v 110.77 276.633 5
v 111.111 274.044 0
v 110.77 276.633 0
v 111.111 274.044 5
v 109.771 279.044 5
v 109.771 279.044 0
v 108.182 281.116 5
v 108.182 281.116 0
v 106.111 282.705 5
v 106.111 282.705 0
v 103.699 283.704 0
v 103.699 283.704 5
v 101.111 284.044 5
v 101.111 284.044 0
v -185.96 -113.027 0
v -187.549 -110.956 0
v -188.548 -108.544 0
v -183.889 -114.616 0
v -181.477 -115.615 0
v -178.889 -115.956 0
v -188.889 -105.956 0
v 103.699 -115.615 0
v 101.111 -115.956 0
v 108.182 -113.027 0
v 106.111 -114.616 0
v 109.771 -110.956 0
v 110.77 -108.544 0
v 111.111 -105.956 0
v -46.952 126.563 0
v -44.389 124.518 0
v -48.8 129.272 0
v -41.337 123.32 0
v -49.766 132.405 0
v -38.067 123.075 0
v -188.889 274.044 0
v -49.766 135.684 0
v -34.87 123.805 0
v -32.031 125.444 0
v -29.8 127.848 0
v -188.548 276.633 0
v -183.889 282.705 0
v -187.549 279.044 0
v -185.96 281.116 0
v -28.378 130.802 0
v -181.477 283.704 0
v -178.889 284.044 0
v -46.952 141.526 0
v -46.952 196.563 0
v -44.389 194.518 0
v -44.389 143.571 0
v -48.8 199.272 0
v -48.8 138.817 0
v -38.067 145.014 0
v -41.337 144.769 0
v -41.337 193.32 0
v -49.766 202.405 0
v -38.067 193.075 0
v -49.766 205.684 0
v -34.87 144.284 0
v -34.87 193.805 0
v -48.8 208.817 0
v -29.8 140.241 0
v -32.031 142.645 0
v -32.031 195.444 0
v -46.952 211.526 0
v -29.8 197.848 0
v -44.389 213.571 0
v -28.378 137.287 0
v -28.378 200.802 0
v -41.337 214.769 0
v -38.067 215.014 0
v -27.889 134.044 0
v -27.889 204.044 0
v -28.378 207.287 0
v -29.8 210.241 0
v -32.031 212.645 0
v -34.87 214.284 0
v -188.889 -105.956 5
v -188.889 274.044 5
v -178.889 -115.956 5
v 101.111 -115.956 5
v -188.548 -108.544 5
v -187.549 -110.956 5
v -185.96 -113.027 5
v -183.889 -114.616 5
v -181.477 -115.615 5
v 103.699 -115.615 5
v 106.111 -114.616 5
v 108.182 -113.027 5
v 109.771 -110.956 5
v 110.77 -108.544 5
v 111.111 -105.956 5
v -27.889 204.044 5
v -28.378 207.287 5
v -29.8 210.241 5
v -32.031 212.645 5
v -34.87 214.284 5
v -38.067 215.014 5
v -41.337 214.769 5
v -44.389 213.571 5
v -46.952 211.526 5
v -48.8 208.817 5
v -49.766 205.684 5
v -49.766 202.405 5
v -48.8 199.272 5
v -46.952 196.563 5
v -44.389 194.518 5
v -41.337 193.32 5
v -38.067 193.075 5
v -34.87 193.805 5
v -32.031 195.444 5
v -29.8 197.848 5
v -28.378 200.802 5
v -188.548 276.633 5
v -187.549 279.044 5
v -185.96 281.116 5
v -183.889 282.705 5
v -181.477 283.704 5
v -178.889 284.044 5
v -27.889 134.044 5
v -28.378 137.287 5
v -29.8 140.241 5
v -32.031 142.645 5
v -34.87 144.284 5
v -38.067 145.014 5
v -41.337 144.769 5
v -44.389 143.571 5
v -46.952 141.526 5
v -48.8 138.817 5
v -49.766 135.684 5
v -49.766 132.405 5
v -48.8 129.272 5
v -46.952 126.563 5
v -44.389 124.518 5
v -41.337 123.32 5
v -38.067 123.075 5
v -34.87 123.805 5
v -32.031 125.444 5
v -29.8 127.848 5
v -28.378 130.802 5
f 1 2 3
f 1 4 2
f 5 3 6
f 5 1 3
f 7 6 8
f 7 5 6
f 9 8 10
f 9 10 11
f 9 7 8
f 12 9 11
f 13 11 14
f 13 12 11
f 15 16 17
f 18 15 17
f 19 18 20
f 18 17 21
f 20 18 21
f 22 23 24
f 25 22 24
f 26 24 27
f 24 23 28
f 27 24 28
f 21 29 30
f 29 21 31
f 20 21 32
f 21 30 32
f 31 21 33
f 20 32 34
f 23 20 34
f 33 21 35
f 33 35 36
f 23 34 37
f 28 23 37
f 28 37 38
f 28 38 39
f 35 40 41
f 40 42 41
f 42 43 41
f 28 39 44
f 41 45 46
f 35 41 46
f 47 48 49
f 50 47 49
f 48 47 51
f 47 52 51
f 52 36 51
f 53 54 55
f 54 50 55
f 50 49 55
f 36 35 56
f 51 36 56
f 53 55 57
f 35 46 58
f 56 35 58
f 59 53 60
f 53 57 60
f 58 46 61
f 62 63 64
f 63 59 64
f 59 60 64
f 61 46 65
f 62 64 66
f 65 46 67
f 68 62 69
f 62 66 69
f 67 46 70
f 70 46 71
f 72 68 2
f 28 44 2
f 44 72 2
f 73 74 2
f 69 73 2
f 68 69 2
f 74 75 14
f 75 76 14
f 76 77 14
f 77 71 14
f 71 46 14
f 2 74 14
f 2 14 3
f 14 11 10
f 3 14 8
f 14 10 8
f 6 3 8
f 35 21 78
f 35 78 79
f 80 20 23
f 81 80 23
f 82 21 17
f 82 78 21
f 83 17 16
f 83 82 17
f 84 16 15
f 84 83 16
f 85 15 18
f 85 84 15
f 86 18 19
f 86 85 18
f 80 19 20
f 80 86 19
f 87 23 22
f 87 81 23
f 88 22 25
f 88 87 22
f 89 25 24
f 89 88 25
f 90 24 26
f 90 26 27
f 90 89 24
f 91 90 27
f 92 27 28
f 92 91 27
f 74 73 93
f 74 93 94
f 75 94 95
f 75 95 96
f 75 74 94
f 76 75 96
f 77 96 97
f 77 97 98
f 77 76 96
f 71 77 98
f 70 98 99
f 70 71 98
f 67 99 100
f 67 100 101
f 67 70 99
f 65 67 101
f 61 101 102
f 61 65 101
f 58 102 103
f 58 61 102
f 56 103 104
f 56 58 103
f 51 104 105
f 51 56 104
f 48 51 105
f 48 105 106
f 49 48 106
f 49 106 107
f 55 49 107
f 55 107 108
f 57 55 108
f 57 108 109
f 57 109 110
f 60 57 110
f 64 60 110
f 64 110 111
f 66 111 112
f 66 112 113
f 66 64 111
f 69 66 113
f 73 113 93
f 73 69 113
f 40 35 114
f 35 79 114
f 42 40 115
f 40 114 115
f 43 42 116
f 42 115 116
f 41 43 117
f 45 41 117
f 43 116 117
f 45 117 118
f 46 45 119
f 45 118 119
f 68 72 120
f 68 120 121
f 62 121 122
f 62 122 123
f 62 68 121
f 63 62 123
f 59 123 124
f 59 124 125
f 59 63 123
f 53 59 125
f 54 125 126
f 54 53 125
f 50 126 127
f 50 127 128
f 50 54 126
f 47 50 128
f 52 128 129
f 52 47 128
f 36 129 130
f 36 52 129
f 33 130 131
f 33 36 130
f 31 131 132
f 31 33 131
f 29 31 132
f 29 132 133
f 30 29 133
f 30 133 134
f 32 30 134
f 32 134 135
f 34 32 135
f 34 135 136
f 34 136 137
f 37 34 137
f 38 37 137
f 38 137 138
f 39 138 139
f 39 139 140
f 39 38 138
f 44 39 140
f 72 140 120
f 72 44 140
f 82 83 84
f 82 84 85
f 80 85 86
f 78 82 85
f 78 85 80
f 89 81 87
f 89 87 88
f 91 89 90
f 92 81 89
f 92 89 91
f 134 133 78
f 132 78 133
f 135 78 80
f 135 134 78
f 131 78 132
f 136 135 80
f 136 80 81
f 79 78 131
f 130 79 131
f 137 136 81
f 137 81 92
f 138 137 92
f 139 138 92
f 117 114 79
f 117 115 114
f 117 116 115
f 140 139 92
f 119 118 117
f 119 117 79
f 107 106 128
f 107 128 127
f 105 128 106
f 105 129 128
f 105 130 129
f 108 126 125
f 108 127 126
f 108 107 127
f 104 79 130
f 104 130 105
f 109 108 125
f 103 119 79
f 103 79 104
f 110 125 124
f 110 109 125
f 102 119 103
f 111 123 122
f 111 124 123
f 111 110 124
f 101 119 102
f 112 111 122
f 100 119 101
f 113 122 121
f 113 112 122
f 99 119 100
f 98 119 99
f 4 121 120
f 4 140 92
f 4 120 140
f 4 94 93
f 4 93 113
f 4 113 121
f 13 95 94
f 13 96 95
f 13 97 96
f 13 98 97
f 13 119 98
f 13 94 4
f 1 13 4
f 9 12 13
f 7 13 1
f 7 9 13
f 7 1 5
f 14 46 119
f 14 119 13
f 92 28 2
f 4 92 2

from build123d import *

# Parameters (mm, degrees)
SKETCH_1_W          = 300
SKETCH_1_H          = 400
EXTRUDE_1_DEPTH     = 5
FILLET_1_R          = 10
SKETCH_2_R          = 11
CUT_EXTRUDE_3_DEPTH = 5


with BuildPart() as part:
    # 草图1 → 凸台-拉伸1 (new body)
    with BuildSketch(Plane.XY):
        with Locations((-38.888888889, 84.044438104)):
            Rectangle(SKETCH_1_W, SKETCH_1_H)
    extrude(amount=EXTRUDE_1_DEPTH)

    # 圆角1
    fillet_1_edges = [part.edges().sort_by_distance(p)[0] for p in [
        (-188.888888889, 284.044438104, 2.5),
        (111.111111111, 284.044438104, 2.5),
        (111.111111111, -115.955561896, 2.5),
        (-188.888888889, -115.955561896, 2.5),
    ]]
    fillet(fillet_1_edges, radius=FILLET_1_R)

    # 草图2 → 切除-拉伸3 (cut)
    with BuildSketch(Plane.XY):
        with Locations((-38.888888889, 204.044438104)):
            Circle(SKETCH_2_R)
        with Locations((-38.888888889, 134.044438104)):
            Circle(SKETCH_2_R)
    extrude(amount=CUT_EXTRUDE_3_DEPTH, mode=Mode.SUBTRACT)


solid = part.part
